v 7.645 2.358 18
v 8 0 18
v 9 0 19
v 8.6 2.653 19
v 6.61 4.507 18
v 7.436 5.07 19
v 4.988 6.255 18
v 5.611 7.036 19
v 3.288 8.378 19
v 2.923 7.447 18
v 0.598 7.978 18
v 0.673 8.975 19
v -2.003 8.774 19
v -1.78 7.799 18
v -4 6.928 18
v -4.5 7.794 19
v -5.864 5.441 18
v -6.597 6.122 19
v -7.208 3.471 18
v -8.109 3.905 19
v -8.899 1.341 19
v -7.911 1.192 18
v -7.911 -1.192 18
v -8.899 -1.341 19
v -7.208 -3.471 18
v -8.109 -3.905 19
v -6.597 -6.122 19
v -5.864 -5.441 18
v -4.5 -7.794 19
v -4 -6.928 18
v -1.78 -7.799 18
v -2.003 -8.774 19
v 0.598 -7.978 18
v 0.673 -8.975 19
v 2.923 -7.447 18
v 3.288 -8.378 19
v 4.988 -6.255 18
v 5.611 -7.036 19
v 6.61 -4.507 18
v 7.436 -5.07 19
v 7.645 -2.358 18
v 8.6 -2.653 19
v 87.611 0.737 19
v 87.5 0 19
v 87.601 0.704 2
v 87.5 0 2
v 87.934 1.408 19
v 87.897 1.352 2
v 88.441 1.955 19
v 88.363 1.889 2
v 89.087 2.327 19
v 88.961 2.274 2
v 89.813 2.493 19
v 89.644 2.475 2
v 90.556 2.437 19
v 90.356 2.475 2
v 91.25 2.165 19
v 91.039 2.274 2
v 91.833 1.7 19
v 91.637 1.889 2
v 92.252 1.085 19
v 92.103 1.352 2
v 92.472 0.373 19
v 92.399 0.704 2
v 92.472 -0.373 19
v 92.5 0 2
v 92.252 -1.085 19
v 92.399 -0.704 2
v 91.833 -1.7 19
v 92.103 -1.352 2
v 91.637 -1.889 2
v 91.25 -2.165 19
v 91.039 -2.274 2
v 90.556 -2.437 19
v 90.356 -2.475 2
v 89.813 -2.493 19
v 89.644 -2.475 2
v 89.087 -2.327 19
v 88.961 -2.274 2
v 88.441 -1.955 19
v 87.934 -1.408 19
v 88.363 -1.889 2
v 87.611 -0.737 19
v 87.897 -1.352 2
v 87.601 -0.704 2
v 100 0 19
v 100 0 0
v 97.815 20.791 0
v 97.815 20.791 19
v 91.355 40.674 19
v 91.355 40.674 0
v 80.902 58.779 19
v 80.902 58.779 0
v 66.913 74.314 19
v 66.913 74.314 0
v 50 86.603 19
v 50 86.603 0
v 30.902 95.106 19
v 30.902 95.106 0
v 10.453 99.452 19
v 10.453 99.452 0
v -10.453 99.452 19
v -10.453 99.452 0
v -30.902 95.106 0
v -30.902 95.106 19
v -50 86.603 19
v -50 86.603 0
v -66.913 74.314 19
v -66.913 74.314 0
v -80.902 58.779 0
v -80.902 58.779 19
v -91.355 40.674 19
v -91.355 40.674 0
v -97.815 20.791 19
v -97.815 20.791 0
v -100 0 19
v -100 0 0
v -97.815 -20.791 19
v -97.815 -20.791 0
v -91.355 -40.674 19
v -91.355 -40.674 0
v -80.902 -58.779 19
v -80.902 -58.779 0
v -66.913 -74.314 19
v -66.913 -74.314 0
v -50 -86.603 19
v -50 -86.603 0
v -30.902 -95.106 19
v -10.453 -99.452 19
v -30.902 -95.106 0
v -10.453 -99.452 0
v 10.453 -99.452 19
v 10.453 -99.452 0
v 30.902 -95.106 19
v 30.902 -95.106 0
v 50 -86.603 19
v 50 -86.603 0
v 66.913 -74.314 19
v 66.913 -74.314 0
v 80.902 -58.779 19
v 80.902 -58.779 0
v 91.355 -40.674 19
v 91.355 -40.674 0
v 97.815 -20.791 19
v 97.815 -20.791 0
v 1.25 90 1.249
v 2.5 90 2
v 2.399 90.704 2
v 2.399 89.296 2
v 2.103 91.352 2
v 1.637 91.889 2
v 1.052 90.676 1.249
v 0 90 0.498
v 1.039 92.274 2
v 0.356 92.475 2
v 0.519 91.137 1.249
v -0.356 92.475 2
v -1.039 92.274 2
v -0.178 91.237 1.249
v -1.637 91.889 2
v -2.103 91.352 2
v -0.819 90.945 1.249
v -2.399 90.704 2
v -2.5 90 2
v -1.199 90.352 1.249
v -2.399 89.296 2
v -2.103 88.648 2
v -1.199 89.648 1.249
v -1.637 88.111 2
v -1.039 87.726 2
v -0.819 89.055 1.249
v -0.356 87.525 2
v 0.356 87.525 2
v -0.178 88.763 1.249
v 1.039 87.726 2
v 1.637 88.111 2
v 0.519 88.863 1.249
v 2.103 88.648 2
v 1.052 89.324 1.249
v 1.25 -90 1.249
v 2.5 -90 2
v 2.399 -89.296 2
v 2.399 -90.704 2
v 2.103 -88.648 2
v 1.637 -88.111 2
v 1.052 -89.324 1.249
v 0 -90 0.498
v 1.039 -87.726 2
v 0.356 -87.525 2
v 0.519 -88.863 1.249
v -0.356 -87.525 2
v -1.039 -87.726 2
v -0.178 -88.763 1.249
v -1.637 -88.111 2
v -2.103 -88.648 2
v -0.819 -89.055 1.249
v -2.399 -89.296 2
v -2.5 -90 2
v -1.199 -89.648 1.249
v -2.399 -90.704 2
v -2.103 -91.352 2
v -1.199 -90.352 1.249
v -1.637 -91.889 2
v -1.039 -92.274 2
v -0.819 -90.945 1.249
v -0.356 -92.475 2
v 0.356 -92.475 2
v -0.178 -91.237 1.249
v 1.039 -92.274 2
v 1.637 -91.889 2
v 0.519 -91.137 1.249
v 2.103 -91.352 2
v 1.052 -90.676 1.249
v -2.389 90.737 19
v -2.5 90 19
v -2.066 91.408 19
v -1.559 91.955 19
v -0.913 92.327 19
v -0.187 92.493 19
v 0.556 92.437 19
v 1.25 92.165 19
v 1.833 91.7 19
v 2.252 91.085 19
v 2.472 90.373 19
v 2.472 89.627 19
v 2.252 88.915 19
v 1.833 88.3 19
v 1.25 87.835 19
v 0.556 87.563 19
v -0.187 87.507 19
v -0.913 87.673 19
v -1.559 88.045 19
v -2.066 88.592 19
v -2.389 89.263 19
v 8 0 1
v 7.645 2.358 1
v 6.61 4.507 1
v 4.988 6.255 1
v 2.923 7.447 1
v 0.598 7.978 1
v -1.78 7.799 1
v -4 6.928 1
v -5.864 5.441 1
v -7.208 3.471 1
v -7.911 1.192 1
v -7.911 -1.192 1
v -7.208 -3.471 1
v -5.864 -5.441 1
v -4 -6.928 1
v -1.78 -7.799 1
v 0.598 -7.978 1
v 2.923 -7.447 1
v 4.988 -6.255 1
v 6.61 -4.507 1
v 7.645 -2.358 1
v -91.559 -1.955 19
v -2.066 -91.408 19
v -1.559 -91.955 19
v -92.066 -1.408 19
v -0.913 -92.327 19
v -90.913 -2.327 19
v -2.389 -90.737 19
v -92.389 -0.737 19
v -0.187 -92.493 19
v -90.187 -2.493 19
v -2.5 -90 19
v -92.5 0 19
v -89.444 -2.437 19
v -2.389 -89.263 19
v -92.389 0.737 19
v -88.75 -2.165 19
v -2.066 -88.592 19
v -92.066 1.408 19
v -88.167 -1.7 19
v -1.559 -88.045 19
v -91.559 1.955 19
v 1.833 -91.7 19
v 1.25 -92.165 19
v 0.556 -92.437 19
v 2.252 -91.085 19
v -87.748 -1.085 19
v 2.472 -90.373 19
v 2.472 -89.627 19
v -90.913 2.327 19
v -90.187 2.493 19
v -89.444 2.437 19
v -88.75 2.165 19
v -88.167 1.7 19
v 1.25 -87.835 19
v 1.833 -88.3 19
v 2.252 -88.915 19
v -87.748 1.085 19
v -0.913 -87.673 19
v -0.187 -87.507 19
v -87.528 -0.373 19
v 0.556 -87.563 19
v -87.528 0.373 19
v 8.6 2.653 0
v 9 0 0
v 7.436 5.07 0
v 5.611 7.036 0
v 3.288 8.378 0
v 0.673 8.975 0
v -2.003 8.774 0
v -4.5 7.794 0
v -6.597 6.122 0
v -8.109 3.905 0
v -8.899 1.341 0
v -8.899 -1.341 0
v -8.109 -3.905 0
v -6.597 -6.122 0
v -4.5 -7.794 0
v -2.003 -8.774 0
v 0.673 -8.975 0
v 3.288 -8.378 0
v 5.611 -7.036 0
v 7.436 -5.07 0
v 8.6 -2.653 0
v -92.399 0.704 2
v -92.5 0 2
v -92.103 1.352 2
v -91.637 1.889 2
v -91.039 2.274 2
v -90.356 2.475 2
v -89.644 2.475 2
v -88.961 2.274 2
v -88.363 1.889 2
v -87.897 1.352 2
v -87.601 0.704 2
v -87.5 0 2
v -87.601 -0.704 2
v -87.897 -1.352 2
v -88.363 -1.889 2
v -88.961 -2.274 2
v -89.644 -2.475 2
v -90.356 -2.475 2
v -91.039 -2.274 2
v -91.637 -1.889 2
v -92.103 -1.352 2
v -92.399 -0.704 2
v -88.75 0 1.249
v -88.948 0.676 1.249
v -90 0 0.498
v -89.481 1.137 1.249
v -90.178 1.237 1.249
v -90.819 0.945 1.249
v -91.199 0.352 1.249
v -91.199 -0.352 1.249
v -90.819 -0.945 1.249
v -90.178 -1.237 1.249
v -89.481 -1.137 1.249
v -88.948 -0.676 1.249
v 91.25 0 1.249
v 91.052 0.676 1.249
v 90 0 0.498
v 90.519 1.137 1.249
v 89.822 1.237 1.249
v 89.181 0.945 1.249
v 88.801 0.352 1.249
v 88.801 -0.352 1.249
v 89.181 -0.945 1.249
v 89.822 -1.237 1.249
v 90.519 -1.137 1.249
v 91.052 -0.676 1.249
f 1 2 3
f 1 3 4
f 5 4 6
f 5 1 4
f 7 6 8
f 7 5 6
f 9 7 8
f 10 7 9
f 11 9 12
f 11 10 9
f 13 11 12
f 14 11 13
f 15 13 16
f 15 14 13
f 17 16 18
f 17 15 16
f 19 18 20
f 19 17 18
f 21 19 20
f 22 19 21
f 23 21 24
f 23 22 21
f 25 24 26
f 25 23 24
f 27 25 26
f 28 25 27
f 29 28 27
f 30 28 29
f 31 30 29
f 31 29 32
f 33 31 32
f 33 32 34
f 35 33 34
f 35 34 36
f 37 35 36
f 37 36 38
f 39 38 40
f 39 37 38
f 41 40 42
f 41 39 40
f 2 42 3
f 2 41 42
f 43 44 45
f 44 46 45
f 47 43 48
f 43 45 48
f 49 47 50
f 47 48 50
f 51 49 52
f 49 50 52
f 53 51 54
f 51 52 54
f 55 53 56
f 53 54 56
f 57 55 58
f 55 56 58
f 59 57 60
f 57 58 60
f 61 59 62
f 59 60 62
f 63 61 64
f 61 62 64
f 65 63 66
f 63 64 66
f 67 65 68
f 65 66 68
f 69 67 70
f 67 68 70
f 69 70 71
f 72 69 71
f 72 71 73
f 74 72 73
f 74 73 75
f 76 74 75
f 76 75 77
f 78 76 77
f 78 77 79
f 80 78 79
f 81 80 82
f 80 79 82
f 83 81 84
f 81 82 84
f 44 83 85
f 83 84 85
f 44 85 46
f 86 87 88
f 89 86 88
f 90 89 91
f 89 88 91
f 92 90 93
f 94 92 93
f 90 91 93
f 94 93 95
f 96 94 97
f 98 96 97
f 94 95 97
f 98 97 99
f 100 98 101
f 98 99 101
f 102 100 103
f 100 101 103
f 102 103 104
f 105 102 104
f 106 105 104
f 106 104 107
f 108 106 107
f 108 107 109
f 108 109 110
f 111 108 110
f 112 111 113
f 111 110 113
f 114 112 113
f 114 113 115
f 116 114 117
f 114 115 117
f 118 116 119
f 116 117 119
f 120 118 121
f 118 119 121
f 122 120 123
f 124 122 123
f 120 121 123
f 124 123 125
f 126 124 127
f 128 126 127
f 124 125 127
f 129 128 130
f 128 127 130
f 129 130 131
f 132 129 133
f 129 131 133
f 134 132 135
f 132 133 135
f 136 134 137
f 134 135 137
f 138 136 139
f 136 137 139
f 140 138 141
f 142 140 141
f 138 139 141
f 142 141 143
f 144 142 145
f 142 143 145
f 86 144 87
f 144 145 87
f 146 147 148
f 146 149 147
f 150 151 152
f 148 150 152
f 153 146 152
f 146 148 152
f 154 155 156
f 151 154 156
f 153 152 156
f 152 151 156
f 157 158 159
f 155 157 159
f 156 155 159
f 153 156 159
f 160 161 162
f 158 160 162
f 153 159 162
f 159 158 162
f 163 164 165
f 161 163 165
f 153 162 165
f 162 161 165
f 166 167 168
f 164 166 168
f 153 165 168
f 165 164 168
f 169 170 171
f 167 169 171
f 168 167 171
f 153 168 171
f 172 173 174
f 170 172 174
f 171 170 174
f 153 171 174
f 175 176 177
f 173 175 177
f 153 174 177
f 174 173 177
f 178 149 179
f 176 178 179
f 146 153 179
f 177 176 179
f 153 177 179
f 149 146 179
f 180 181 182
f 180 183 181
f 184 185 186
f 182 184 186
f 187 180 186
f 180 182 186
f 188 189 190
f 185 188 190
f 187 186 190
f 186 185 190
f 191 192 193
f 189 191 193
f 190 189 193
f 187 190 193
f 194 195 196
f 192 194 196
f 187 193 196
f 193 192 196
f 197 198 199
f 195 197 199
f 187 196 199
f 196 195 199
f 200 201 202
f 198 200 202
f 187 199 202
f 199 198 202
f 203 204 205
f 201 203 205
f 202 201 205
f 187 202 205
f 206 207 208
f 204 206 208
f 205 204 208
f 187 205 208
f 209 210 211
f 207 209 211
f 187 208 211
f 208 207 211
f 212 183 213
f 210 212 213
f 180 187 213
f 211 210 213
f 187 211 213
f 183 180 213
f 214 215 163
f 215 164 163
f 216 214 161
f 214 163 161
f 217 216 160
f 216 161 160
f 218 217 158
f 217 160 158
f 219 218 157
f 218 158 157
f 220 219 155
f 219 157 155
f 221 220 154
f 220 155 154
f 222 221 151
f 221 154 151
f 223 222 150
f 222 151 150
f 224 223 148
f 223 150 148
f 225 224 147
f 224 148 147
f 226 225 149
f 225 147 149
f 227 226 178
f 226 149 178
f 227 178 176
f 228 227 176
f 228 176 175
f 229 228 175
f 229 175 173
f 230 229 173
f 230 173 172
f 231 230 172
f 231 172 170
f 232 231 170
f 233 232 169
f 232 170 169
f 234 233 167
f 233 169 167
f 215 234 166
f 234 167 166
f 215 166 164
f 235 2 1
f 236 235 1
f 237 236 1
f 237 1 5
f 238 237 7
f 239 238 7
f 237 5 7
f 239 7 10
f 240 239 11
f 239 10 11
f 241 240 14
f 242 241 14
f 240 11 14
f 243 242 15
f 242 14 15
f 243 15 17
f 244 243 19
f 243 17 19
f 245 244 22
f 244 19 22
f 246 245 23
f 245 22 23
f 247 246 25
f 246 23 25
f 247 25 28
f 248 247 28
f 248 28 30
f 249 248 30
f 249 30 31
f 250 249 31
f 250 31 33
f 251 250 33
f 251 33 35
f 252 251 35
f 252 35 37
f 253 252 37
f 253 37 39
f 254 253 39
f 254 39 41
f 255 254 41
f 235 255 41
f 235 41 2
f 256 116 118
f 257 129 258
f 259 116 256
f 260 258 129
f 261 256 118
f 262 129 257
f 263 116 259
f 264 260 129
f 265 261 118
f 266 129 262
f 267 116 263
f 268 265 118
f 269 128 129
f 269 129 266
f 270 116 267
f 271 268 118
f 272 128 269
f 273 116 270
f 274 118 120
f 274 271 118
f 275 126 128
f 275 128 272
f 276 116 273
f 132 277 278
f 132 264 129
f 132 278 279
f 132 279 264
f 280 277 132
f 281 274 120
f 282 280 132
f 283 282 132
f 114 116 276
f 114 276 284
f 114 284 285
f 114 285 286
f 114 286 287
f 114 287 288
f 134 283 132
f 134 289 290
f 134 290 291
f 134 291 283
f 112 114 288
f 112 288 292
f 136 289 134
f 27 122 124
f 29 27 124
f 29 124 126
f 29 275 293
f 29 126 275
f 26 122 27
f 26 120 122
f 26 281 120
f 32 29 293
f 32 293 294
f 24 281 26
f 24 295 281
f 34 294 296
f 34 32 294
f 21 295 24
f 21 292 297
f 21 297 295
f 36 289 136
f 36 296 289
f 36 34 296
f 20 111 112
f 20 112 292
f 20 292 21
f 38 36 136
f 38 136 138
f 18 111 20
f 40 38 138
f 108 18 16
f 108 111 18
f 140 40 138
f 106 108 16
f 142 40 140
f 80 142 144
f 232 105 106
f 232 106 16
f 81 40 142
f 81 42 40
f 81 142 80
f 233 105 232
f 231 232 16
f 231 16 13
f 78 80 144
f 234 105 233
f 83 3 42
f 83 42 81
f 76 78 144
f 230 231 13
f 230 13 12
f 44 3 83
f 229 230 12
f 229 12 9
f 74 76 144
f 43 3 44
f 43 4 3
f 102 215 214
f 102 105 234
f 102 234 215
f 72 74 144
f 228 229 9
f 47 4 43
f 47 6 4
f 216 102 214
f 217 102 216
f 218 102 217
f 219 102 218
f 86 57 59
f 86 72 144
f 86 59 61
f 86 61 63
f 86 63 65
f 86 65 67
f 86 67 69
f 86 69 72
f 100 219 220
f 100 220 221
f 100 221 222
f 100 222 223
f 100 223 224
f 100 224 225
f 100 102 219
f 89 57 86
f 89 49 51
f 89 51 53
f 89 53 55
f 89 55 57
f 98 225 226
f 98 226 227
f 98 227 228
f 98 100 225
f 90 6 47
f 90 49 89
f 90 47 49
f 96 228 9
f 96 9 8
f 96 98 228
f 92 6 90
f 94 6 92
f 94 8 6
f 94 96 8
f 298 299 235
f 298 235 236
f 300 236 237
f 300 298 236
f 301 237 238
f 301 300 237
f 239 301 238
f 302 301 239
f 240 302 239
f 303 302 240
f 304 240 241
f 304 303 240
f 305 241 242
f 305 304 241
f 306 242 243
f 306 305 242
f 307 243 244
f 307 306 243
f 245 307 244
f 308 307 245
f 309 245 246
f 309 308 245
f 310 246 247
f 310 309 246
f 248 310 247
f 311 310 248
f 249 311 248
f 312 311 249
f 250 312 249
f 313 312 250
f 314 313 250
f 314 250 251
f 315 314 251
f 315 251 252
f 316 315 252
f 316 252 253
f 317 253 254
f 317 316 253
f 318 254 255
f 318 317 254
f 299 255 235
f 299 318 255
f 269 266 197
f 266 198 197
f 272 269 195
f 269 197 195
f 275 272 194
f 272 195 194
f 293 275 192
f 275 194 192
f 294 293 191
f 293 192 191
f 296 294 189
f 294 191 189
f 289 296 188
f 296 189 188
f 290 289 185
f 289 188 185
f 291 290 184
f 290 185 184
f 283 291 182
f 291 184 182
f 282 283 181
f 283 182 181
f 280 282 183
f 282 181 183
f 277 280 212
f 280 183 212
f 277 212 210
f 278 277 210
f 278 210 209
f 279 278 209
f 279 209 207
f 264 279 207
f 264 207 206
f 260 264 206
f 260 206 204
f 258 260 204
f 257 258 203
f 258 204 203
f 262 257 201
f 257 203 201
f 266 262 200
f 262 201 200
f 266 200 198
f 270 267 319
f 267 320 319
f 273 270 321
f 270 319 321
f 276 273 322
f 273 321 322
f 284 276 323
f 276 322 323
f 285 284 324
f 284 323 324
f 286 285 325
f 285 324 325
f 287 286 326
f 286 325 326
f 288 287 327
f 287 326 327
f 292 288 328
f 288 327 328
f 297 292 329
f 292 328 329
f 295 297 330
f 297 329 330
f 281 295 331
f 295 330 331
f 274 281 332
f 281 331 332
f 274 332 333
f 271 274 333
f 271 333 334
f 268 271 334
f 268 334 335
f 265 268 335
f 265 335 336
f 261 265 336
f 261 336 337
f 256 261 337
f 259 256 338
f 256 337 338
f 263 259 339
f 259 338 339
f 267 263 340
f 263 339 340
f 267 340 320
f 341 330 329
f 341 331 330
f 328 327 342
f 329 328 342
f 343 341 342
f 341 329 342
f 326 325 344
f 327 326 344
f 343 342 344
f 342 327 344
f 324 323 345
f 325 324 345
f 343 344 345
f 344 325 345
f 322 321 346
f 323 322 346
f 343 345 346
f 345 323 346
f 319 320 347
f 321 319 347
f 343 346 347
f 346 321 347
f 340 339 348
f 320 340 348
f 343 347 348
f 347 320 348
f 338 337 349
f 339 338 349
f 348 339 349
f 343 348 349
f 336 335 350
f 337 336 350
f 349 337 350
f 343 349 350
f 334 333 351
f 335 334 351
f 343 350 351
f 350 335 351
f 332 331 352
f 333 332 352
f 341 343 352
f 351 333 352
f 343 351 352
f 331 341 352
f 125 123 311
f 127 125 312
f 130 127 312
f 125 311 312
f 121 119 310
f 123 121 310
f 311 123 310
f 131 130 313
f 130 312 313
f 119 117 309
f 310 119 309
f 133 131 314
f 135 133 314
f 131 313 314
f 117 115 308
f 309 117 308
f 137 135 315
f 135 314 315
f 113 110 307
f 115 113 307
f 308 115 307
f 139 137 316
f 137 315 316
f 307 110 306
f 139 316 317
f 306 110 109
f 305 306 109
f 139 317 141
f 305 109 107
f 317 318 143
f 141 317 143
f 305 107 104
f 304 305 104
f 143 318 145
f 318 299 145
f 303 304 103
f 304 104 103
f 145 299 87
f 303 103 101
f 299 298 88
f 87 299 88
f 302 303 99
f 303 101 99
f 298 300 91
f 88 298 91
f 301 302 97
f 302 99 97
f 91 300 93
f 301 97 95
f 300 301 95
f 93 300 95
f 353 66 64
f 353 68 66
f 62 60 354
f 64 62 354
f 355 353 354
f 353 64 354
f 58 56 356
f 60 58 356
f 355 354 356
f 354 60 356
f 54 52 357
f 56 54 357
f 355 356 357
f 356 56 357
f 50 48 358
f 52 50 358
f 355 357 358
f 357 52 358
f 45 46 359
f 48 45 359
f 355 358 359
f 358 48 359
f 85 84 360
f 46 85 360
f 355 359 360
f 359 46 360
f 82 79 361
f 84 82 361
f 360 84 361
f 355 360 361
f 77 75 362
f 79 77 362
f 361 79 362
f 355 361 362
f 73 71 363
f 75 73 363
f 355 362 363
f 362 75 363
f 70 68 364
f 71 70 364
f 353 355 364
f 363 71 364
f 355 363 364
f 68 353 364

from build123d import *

# Parameters (mm, degrees)
SKETCH_1_R          = 100
EXTRUDE_1_DEPTH     = 19
M6X1_0_1_D          = 5
M6X1_0_1_DEPTH      = 17
M6X1_0_1_TIP        = 1.502151548
SKETCH_2_R          = 8
CUT_EXTRUDE_1_DEPTH = 143.691975948
CHAMFER_1_SIZE      = 1
CHAMFER_2_SIZE      = 1


with BuildPart() as part:
    # ｽｹｯﾁ1 → ﾎﾞｽ - 押し出し1 (new body)
    with BuildSketch(Plane.XY):
        Circle(SKETCH_1_R)
    extrude(amount=EXTRUDE_1_DEPTH)

    # M6x1.0 ねじ穴1
    with Locations(Plane(origin=(0, 90, 19), x_dir=(1, 0, 0), z_dir=(0, 0, 1))):
        with Locations((0, 0), (-90, -90), (0, -180), (90, -90)):
            Hole(M6X1_0_1_D / 2, depth=M6X1_0_1_DEPTH)
            with Locations((0, 0, -(M6X1_0_1_DEPTH + M6X1_0_1_TIP / 2))):  # 118° drill point
                Cone(0, M6X1_0_1_D / 2, M6X1_0_1_TIP, mode=Mode.SUBTRACT)

    # ｽｹｯﾁ2 → ｶｯﾄ - 押し出し1 (cut, through all)
    with BuildSketch(Plane.XY.offset(19)):
        Circle(SKETCH_2_R)
    extrude(amount=-CUT_EXTRUDE_1_DEPTH, mode=Mode.SUBTRACT)

    # 面取り1
    chamfer_1_edges = [part.edges().sort_by_distance(p)[0] for p in [
        (-8, 0, 19),
    ]]
    chamfer(chamfer_1_edges, length=CHAMFER_1_SIZE)

    # 面取り2
    chamfer_2_edges = [part.edges().sort_by_distance(p)[0] for p in [
        (-8, 0, 0),
    ]]
    chamfer(chamfer_2_edges, length=CHAMFER_2_SIZE)


solid = part.part
